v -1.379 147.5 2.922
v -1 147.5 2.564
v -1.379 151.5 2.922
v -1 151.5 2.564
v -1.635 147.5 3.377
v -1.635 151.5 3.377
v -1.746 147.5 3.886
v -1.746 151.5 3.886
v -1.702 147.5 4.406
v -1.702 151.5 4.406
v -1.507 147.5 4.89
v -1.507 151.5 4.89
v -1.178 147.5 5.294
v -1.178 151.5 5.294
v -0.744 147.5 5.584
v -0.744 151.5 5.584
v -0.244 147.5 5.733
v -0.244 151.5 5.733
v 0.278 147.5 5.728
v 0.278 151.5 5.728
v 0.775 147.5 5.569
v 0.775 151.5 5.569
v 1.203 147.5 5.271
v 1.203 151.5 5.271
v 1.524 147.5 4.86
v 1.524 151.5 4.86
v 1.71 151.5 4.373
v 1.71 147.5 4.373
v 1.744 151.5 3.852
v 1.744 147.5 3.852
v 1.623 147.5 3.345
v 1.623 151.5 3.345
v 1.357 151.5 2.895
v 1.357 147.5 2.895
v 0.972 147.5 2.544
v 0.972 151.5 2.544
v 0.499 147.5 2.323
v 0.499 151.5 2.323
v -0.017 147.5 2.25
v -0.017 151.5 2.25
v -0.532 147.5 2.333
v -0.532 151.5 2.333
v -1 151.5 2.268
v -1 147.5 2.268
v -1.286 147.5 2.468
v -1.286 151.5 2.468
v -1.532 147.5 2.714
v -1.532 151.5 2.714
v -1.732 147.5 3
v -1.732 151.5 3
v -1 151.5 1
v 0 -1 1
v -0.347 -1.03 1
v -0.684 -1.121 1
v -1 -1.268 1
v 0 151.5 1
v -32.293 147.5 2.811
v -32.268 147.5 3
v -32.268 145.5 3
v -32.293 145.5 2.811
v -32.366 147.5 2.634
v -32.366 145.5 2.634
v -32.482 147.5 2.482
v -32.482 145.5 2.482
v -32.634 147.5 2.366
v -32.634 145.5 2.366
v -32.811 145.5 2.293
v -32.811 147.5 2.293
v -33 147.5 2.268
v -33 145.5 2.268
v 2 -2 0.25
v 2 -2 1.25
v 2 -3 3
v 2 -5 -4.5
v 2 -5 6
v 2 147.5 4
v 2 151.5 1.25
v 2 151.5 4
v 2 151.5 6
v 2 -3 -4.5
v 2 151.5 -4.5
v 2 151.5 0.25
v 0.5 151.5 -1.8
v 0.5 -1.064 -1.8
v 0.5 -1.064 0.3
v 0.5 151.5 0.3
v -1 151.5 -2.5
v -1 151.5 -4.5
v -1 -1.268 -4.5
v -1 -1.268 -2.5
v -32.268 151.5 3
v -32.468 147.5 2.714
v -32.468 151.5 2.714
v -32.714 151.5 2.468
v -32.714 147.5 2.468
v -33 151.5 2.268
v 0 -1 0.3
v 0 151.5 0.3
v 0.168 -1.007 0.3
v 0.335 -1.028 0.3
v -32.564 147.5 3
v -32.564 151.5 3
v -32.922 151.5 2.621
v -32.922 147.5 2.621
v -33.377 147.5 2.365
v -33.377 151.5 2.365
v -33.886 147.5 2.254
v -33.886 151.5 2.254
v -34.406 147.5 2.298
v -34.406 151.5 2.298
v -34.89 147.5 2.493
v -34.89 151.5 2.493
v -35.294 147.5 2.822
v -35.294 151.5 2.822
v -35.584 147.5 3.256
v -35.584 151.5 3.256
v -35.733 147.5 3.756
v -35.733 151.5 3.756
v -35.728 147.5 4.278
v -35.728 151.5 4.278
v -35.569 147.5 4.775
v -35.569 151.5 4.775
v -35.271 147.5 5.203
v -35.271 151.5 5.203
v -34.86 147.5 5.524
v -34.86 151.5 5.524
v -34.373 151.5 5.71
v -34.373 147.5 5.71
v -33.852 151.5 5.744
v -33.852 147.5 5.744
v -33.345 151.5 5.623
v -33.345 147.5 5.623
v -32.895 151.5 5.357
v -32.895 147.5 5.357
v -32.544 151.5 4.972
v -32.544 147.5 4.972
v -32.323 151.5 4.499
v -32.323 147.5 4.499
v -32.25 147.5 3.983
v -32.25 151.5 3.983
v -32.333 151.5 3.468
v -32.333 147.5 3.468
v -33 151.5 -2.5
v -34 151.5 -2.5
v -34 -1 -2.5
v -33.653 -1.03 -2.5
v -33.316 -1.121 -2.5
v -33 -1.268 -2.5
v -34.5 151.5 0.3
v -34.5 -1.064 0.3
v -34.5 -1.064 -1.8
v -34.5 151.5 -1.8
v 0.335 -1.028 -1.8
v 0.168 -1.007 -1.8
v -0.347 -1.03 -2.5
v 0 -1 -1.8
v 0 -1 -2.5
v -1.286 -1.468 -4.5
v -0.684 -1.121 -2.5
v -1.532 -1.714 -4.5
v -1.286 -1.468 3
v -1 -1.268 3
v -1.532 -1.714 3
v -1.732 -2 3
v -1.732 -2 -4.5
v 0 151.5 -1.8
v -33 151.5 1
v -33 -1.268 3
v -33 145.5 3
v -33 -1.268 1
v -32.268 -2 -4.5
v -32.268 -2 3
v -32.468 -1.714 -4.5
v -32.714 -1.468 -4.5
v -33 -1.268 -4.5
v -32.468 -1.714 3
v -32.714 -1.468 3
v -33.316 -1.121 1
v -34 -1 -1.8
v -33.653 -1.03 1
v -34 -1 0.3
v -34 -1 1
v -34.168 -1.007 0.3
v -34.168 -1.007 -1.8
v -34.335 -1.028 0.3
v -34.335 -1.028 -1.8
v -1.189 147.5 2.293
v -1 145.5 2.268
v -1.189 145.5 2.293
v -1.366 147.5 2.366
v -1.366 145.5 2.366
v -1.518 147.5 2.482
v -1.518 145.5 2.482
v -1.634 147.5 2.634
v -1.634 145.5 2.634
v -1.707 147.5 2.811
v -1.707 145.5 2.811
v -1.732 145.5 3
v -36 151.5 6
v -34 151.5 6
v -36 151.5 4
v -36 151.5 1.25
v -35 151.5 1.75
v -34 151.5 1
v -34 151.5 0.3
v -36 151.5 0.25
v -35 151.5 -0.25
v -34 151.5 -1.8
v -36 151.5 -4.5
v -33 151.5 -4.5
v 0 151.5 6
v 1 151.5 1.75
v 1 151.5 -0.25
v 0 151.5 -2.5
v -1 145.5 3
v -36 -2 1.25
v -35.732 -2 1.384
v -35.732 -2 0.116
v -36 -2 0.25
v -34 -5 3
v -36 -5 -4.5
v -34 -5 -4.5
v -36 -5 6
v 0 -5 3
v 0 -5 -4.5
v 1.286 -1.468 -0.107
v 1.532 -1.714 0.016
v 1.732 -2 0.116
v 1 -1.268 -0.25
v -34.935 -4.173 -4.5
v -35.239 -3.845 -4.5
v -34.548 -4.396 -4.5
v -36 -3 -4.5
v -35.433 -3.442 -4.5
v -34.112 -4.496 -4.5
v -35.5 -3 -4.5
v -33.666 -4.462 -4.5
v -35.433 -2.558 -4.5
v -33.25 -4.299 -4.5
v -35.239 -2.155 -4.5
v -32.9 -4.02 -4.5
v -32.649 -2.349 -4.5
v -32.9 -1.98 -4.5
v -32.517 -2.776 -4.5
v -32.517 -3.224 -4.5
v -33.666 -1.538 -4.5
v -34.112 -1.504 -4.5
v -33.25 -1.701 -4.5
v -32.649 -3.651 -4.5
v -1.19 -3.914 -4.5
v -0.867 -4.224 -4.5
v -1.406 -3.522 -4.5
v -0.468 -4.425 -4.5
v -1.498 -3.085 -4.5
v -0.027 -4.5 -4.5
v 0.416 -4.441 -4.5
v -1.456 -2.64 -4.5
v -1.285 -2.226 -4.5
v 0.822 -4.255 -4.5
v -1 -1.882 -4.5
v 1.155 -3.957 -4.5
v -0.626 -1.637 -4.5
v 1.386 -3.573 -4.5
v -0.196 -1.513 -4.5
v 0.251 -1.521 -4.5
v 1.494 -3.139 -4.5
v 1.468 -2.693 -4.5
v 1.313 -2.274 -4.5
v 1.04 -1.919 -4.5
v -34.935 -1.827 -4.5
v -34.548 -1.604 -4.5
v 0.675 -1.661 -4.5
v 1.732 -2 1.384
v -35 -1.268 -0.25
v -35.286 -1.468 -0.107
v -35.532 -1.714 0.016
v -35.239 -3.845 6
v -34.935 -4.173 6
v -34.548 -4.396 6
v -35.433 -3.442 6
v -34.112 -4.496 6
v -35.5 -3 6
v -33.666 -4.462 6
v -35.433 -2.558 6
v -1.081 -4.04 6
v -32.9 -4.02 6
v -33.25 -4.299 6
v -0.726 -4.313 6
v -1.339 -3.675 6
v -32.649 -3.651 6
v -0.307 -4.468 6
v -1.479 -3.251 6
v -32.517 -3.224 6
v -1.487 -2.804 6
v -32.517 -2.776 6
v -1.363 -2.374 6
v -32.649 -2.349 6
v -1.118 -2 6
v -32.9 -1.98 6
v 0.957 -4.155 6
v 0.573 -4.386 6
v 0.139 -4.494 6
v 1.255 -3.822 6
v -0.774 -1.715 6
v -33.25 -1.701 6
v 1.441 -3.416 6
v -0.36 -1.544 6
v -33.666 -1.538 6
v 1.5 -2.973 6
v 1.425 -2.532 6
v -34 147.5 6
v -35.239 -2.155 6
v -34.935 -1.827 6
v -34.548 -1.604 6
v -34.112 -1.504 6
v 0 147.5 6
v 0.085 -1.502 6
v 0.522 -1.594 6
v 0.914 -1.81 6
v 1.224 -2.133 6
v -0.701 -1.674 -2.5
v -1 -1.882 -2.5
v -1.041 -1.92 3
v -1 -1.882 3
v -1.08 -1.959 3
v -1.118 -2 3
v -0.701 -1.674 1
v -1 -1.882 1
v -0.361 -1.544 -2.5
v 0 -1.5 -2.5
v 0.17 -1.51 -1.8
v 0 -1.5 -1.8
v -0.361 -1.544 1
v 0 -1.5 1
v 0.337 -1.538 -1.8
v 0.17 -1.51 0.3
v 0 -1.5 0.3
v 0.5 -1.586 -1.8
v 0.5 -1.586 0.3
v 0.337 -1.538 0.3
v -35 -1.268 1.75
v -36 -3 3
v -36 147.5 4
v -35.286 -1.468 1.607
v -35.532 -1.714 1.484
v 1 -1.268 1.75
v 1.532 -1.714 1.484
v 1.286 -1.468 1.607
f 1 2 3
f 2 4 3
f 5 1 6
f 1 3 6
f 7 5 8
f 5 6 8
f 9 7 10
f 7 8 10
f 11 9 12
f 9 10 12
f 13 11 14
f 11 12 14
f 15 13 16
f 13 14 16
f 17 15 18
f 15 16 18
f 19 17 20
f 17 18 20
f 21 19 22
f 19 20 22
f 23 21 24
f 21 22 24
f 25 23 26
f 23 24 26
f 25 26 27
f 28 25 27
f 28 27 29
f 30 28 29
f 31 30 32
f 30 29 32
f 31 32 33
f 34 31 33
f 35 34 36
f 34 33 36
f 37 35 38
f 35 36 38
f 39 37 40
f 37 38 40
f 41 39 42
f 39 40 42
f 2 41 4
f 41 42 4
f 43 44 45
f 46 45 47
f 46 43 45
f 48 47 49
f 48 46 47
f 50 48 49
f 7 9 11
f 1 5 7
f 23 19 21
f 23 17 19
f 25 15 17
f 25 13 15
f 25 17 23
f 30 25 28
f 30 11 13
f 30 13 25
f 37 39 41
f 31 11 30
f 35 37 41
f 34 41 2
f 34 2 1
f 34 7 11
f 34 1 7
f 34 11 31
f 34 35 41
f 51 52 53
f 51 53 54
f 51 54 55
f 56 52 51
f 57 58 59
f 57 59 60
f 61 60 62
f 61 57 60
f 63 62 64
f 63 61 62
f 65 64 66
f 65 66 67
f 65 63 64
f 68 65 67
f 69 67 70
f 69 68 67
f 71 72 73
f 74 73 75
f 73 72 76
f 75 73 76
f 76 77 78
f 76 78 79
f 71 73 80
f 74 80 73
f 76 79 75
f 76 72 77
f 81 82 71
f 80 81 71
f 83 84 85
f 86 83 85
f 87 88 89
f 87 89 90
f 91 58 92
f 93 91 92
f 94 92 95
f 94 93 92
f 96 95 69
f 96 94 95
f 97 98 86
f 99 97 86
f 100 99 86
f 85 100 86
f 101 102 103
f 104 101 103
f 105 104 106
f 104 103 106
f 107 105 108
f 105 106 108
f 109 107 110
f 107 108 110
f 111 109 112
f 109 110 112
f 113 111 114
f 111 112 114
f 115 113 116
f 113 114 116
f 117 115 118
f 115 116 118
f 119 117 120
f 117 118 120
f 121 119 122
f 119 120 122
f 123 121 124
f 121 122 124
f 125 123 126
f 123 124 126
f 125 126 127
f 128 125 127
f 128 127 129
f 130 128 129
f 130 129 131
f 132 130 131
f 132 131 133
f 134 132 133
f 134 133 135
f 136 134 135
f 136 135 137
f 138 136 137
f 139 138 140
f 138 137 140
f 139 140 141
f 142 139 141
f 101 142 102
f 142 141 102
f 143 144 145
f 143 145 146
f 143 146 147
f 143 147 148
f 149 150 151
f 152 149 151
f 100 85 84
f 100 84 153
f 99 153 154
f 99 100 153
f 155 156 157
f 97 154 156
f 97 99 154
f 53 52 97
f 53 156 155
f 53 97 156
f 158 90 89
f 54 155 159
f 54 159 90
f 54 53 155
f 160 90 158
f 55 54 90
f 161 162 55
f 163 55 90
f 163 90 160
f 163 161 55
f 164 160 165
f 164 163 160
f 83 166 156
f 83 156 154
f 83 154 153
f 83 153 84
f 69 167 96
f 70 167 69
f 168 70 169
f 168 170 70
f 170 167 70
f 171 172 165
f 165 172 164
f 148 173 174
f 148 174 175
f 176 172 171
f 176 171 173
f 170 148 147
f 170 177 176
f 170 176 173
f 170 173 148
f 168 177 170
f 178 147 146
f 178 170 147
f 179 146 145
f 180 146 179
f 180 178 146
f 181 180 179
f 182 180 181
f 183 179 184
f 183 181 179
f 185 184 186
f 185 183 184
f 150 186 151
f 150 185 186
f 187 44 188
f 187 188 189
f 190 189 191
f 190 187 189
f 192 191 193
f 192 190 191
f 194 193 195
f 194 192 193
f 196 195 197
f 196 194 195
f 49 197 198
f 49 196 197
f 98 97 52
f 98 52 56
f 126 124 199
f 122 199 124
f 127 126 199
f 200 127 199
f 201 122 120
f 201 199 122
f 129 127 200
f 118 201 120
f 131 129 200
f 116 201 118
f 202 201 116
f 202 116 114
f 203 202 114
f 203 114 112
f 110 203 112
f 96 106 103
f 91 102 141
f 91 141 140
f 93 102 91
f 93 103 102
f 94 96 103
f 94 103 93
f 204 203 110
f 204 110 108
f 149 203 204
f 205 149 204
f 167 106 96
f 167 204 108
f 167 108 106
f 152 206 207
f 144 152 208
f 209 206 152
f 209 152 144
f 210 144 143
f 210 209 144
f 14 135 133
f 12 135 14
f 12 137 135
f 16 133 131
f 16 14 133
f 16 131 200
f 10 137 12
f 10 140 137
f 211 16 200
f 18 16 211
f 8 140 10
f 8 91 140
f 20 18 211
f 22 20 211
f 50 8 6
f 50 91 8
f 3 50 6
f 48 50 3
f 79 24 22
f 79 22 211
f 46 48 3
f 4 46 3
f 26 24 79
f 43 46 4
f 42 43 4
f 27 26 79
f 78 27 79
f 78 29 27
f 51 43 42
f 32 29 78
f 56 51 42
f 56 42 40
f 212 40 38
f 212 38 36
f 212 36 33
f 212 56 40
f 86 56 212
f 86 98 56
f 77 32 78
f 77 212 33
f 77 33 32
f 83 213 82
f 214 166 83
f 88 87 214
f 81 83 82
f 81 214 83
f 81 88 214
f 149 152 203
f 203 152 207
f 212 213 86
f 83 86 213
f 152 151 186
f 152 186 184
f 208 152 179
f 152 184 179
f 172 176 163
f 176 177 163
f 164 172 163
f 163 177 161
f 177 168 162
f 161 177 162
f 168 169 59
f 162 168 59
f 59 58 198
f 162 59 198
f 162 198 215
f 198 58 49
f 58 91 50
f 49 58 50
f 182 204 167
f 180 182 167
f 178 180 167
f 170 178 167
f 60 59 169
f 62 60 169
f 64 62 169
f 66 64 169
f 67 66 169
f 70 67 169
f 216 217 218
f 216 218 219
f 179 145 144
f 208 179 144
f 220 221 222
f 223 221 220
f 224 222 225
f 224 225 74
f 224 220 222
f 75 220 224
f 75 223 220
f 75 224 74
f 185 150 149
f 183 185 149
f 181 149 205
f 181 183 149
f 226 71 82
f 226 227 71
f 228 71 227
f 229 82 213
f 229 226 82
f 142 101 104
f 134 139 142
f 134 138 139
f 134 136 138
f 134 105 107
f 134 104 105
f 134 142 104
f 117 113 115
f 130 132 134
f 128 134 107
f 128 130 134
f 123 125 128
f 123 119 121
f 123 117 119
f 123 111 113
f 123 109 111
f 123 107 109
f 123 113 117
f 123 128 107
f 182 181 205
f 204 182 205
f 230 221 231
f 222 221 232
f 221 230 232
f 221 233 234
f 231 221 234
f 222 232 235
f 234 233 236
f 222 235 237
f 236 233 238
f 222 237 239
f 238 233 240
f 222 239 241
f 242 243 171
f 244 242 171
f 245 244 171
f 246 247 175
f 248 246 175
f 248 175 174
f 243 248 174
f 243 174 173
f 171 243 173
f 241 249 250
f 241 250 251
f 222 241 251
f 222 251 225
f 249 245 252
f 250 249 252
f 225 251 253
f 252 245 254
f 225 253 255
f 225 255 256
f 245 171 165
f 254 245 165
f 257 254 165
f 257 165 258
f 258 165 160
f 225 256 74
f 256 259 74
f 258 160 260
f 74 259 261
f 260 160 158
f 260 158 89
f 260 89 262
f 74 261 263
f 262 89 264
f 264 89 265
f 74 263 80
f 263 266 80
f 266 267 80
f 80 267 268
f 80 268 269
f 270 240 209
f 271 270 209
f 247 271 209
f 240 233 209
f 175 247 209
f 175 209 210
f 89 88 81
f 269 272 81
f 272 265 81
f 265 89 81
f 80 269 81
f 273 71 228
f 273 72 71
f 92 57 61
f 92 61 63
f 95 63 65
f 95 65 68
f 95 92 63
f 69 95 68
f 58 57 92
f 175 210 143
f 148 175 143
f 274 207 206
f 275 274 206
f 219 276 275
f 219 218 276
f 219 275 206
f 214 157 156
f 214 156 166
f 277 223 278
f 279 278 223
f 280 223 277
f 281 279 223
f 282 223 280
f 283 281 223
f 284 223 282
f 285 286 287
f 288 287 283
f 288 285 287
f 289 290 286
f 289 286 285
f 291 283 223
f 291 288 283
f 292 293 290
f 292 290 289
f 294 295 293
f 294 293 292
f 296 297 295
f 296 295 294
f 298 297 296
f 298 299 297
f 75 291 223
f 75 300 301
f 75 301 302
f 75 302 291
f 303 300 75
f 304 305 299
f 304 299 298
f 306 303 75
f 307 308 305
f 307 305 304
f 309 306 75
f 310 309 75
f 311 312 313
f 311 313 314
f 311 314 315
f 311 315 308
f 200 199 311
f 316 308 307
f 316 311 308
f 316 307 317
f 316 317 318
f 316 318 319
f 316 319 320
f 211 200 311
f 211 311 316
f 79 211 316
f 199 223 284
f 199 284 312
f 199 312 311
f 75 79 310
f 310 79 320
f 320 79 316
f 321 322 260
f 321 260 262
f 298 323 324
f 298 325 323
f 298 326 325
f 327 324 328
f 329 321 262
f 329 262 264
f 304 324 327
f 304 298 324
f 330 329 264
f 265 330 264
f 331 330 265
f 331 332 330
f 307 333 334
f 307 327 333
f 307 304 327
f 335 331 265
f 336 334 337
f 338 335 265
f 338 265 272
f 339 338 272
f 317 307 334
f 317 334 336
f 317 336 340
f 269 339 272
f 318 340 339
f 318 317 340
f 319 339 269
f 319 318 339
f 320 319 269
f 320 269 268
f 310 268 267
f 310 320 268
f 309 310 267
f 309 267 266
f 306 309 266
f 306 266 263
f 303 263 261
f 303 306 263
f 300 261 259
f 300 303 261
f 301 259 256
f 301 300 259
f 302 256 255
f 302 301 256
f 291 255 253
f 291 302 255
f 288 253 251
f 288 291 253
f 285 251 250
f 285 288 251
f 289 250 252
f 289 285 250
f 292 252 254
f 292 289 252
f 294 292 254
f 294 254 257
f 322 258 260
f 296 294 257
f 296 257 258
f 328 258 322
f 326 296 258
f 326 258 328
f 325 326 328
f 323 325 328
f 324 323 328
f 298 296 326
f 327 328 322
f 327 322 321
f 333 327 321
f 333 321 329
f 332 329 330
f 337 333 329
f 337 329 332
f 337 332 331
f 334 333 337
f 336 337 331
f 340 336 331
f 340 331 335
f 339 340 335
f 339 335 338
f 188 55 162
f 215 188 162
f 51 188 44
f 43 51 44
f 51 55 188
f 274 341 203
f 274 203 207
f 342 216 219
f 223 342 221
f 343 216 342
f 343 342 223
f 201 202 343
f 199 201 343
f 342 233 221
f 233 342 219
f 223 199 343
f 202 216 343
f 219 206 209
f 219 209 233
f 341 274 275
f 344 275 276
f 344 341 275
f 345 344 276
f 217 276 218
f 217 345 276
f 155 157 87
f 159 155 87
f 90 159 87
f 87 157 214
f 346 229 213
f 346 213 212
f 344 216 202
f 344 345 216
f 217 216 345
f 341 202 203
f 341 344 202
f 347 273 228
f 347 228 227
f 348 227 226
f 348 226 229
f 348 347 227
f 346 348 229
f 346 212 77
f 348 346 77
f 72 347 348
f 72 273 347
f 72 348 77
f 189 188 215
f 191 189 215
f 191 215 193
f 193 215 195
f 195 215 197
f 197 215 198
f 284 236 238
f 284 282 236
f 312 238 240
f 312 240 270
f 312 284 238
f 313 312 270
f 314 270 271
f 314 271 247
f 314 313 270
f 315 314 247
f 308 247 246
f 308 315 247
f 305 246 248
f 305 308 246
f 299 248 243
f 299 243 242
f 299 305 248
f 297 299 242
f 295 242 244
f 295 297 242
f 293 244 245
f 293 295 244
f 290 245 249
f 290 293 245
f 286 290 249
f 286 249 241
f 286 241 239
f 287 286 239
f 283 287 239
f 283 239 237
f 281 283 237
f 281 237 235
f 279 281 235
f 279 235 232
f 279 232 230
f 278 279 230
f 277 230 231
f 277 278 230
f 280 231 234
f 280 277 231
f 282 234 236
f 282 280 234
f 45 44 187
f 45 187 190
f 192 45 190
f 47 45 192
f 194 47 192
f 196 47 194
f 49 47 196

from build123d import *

# Parameters (mm, degrees)
P_IDAT_VYSUNUT_M2_DEPTH        = 3
P_IDAT_VYSUNUT_M2_DEPTH_BACK   = 4.5
SKICA1_W                       = 2
SKICA1_H                       = 153.5
P_IDAT_VYSUNUT_M2_2_DEPTH      = 3
P_IDAT_VYSUNUT_M2_2_DEPTH_BACK = 4.5
SKICA3_W                       = 2
SKICA3_H                       = 153.5
P_IDAT_VYSUNUT_M3_DEPTH        = 1
SKICA5_W                       = 0.5
SKICA5_H                       = 0.3
SKICA5_H_2                     = 1.5
ODEBRAT_VYSUNUT_M2_DEPTH       = 158.729198312
SKICA6_W                       = 1
SKICA6_H                       = 2
P_IDAT_VYSUNUT_M4_DEPTH        = 153.5
SKICA7_W                       = 38
SKICA7_H                       = 153.5
P_IDAT_VYSUNUT_M5_DEPTH        = 3
SKICA8_W                       = 38
SKICA8_H                       = 10.5
P_IDAT_VYSUNUT_M6_DEPTH        = 3
SKICA4_W                       = 0.5
SKICA4_H                       = 0.3
SKICA4_H_2                     = 1.5
ODEBRAT_VYSUNUT_M3_DEPTH       = 158.779117756
ODEBRAT_VYSUNUT_M6_DEPTH       = 153.5
ODEBRAT_START                  = -10.5
SKICA14_R                      = 1.5
ODEBRAT_VYSUNUT_M9_DEPTH       = 10.5
SKICA22_R                      = 2
SKICA22_R_2                    = 1.5
P_IDAT_VYSUNUT_M12_DEPTH       = 10.5
P_IDAT_START                   = -7.5
SKICA15_R                      = 2
SKICA15_R_2                    = 1.75
P_IDAT_VYSUNUT_M7_DEPTH        = 7.5
SKICA16_R                      = 1.75
ODEBRAT_VYSUNUT_M10_DEPTH      = 4
SKICA17_R                      = 2
SKICA17_R_2                    = 1.75
P_IDAT_VYSUNUT_M10_DEPTH       = 4
P_IDAT_VYSUNUT_M11_DEPTH       = 2


with BuildPart() as part:
    # Skica1 → Přidat vysunutím2 (new, two sides: drawn at the far end of the back side and taken through both)
    with BuildSketch(Plane.XY.offset(-P_IDAT_VYSUNUT_M2_DEPTH_BACK)):
        with Locations((1, 74.75)):
            Rectangle(SKICA1_W, SKICA1_H)
    extrude(amount=P_IDAT_VYSUNUT_M2_DEPTH + P_IDAT_VYSUNUT_M2_DEPTH_BACK)

    # Skica3 → Přidat vysunutím3 (add)
    with BuildSketch(Plane.ZY):
        with Locations((-3.5, 74.75)):
            Rectangle(SKICA3_W, SKICA3_H)
        with Locations((2, 74.75)):
            Rectangle(SKICA3_W, SKICA3_H)
    extrude(amount=P_IDAT_VYSUNUT_M3_DEPTH)



with BuildPart() as body_2:
    # Skica1 → P_idat vysunut_m2 2 (new, two sides: drawn at the far end of the back side and taken through both)
    with BuildSketch(Plane.XY.offset(-P_IDAT_VYSUNUT_M2_2_DEPTH_BACK)):
        with Locations((-35, 74.75)):
            Rectangle(SKICA1_W, SKICA1_H)
    extrude(amount=P_IDAT_VYSUNUT_M2_2_DEPTH + P_IDAT_VYSUNUT_M2_2_DEPTH_BACK)

    # Skica5 → Odebrat vysunutím2 (cut, through all)
    with BuildSketch(Plane.XZ.offset(2)):
        with Locations((-34.25, -1.65)):
            Rectangle(SKICA5_W, SKICA5_H)
        with Locations((-34.25, -0.75)):
            Rectangle(SKICA5_W, SKICA5_H_2)
        with Locations((-34.25, 0.15)):
            Rectangle(SKICA5_W, SKICA5_H)
    extrude(amount=-ODEBRAT_VYSUNUT_M2_DEPTH, mode=Mode.SUBTRACT)

    # Skica6 → Přidat vysunutím4 (add, through all)
    with BuildSketch(Plane.XZ.offset(2)):
        with Locations((-33.5, 2)):
            Rectangle(SKICA6_W, SKICA6_H)
        with Locations((-33.5, -3.5)):
            Rectangle(SKICA6_W, SKICA6_H)
    extrude(amount=-P_IDAT_VYSUNUT_M4_DEPTH)


with BuildPart() as part_1:
    add(part.part)

    add(body_2.part)  # Přidat vysunutím5 merges body 2
    # Skica7 → Přidat vysunutím5 (add)
    with BuildSketch(Plane.XY.offset(3)):
        with Locations((-17, 74.75)):
            Rectangle(SKICA7_W, SKICA7_H)
    extrude(amount=P_IDAT_VYSUNUT_M5_DEPTH)

    # Skica8 → Přidat vysunutím6 (add)
    with BuildSketch(Plane.XZ.offset(2)):
        with Locations((-17, 0.75)):
            Rectangle(SKICA8_W, SKICA8_H)
    extrude(amount=P_IDAT_VYSUNUT_M6_DEPTH)

    # Skica4 → Odebrat vysunutím3 (cut, through all)
    with BuildSketch(Plane.XZ.offset(2)):
        with Locations((0.25, 0.15)):
            Rectangle(SKICA4_W, SKICA4_H)
        with Locations((0.25, -0.75)):
            Rectangle(SKICA4_W, SKICA4_H_2)
        with Locations((0.25, -1.65)):
            Rectangle(SKICA4_W, SKICA4_H)
    extrude(amount=-ODEBRAT_VYSUNUT_M3_DEPTH, mode=Mode.SUBTRACT)

    # Skica11 → Odebrat vysunutím6 (cut)
    with BuildSketch(Plane(origin=(-33, -2, 3), x_dir=(1, 0, 0), z_dir=(0, -1, 0))):
        Polygon((-2, -1.25), (-2, -3.25), (-3, -2.75), (-3, -1.75), align=None)
        Polygon((34, -1.25), (35, -1.75), (35, -2.75), (34, -3.25), align=None)
    extrude(amount=-ODEBRAT_VYSUNUT_M6_DEPTH, mode=Mode.SUBTRACT)

    # Skica14 → Odebrat vysunutím9 (cut)
    with BuildSketch(Plane(origin=(0, 0, -4.5), x_dir=(-1, 0, 0), z_dir=(0, 0, -1)).offset(ODEBRAT_START)):
        with Locations((34, -3)):
            Circle(SKICA14_R)
        with Locations(Location((0, -3, 0), (0, 0, 41.810314896))):
            Circle(SKICA14_R)
    extrude(amount=ODEBRAT_VYSUNUT_M9_DEPTH, mode=Mode.SUBTRACT)

    # Skica22 → Přidat vysunutím12 (add)
    # profile 1 of 2: a face of its own
    with BuildSketch(Plane.XY.offset(6)):
        with Locations((-34, -3)):
            Circle(SKICA22_R)
        with Locations(Location((-34, -3, 0), (0, 0, 180))):
            Circle(SKICA22_R_2, mode=Mode.SUBTRACT)
    # profile 2 of 2: a face of its own
    with BuildSketch(Plane.XY.offset(6)):
        with Locations((0, -3)):
            Circle(SKICA22_R)
        with Locations((0, -3)):
            Circle(SKICA22_R_2, mode=Mode.SUBTRACT)
    extrude(amount=-P_IDAT_VYSUNUT_M12_DEPTH)

    # Skica15 → Přidat vysunutím7 (add)
    # profile 1 of 2: a face of its own
    with BuildSketch(Plane(origin=(0, 0, -4.5), x_dir=(-1, 0, 0), z_dir=(0, 0, -1)).offset(P_IDAT_START)):
        with Locations((34, -3)):
            Circle(SKICA15_R)
        with Locations((34, -3)):
            Circle(SKICA15_R_2, mode=Mode.SUBTRACT)
    # profile 2 of 2: a face of its own
    with BuildSketch(Plane(origin=(0, 0, -4.5), x_dir=(-1, 0, 0), z_dir=(0, 0, -1)).offset(P_IDAT_START)):
        with Locations((0, -3)):
            Circle(SKICA15_R)
        with Locations((0, -3)):
            Circle(SKICA15_R_2, mode=Mode.SUBTRACT)
    extrude(amount=P_IDAT_VYSUNUT_M7_DEPTH)

    # Skica16 → Odebrat vysunutím10 (cut)
    with BuildSketch(Plane(origin=(0, 151.5, 0), x_dir=(1, 0, 0), z_dir=(0, 1, 0))):
        with Locations((0, -4)):
            Circle(SKICA16_R)
        with Locations((-34, -4)):
            Circle(SKICA16_R)
    extrude(amount=-ODEBRAT_VYSUNUT_M10_DEPTH, mode=Mode.SUBTRACT)

    # Skica17 → Přidat vysunutím10 (add)
    # profile 1 of 2: a face of its own
    with BuildSketch(Plane(origin=(0, 151.5, 0), x_dir=(1, 0, 0), z_dir=(0, 1, 0))):
        with Locations((0, -4)):
            Circle(SKICA17_R)
        with Locations(Location((0, -4, 0), (0, 0, 270))):
            Circle(SKICA17_R_2, mode=Mode.SUBTRACT)
    # profile 2 of 2: a face of its own
    with BuildSketch(Plane(origin=(0, 151.5, 0), x_dir=(1, 0, 0), z_dir=(0, 1, 0))):
        with Locations((-34, -4)):
            Circle(SKICA17_R)
        with Locations(Location((-34, -4, 0), (0, 0, 34.849904579))):
            Circle(SKICA17_R_2, mode=Mode.SUBTRACT)
    extrude(amount=-P_IDAT_VYSUNUT_M10_DEPTH)

    # Skica18 → Přidat vysunutím11 (add)
    with BuildSketch(Plane.XZ.offset(-147.5)):
        with BuildLine():
            Line((-33, 2.267949192), (-33, 3))
            Line((-33, 3), (-32.267949192, 3))
            ThreePointArc((-32.267949192, 3), (-32.48236191, 2.48236191), (-33, 2.267949192))
        make_face()
        with BuildLine():
            Line((-1.732050808, 3), (-1, 3))
            Line((-1, 3), (-1, 2.267949192))
            ThreePointArc((-1, 2.267949192), (-1.51763809, 2.48236191), (-1.732050808, 3))
        make_face()
    extrude(amount=P_IDAT_VYSUNUT_M11_DEPTH)


solid = part_1.part
